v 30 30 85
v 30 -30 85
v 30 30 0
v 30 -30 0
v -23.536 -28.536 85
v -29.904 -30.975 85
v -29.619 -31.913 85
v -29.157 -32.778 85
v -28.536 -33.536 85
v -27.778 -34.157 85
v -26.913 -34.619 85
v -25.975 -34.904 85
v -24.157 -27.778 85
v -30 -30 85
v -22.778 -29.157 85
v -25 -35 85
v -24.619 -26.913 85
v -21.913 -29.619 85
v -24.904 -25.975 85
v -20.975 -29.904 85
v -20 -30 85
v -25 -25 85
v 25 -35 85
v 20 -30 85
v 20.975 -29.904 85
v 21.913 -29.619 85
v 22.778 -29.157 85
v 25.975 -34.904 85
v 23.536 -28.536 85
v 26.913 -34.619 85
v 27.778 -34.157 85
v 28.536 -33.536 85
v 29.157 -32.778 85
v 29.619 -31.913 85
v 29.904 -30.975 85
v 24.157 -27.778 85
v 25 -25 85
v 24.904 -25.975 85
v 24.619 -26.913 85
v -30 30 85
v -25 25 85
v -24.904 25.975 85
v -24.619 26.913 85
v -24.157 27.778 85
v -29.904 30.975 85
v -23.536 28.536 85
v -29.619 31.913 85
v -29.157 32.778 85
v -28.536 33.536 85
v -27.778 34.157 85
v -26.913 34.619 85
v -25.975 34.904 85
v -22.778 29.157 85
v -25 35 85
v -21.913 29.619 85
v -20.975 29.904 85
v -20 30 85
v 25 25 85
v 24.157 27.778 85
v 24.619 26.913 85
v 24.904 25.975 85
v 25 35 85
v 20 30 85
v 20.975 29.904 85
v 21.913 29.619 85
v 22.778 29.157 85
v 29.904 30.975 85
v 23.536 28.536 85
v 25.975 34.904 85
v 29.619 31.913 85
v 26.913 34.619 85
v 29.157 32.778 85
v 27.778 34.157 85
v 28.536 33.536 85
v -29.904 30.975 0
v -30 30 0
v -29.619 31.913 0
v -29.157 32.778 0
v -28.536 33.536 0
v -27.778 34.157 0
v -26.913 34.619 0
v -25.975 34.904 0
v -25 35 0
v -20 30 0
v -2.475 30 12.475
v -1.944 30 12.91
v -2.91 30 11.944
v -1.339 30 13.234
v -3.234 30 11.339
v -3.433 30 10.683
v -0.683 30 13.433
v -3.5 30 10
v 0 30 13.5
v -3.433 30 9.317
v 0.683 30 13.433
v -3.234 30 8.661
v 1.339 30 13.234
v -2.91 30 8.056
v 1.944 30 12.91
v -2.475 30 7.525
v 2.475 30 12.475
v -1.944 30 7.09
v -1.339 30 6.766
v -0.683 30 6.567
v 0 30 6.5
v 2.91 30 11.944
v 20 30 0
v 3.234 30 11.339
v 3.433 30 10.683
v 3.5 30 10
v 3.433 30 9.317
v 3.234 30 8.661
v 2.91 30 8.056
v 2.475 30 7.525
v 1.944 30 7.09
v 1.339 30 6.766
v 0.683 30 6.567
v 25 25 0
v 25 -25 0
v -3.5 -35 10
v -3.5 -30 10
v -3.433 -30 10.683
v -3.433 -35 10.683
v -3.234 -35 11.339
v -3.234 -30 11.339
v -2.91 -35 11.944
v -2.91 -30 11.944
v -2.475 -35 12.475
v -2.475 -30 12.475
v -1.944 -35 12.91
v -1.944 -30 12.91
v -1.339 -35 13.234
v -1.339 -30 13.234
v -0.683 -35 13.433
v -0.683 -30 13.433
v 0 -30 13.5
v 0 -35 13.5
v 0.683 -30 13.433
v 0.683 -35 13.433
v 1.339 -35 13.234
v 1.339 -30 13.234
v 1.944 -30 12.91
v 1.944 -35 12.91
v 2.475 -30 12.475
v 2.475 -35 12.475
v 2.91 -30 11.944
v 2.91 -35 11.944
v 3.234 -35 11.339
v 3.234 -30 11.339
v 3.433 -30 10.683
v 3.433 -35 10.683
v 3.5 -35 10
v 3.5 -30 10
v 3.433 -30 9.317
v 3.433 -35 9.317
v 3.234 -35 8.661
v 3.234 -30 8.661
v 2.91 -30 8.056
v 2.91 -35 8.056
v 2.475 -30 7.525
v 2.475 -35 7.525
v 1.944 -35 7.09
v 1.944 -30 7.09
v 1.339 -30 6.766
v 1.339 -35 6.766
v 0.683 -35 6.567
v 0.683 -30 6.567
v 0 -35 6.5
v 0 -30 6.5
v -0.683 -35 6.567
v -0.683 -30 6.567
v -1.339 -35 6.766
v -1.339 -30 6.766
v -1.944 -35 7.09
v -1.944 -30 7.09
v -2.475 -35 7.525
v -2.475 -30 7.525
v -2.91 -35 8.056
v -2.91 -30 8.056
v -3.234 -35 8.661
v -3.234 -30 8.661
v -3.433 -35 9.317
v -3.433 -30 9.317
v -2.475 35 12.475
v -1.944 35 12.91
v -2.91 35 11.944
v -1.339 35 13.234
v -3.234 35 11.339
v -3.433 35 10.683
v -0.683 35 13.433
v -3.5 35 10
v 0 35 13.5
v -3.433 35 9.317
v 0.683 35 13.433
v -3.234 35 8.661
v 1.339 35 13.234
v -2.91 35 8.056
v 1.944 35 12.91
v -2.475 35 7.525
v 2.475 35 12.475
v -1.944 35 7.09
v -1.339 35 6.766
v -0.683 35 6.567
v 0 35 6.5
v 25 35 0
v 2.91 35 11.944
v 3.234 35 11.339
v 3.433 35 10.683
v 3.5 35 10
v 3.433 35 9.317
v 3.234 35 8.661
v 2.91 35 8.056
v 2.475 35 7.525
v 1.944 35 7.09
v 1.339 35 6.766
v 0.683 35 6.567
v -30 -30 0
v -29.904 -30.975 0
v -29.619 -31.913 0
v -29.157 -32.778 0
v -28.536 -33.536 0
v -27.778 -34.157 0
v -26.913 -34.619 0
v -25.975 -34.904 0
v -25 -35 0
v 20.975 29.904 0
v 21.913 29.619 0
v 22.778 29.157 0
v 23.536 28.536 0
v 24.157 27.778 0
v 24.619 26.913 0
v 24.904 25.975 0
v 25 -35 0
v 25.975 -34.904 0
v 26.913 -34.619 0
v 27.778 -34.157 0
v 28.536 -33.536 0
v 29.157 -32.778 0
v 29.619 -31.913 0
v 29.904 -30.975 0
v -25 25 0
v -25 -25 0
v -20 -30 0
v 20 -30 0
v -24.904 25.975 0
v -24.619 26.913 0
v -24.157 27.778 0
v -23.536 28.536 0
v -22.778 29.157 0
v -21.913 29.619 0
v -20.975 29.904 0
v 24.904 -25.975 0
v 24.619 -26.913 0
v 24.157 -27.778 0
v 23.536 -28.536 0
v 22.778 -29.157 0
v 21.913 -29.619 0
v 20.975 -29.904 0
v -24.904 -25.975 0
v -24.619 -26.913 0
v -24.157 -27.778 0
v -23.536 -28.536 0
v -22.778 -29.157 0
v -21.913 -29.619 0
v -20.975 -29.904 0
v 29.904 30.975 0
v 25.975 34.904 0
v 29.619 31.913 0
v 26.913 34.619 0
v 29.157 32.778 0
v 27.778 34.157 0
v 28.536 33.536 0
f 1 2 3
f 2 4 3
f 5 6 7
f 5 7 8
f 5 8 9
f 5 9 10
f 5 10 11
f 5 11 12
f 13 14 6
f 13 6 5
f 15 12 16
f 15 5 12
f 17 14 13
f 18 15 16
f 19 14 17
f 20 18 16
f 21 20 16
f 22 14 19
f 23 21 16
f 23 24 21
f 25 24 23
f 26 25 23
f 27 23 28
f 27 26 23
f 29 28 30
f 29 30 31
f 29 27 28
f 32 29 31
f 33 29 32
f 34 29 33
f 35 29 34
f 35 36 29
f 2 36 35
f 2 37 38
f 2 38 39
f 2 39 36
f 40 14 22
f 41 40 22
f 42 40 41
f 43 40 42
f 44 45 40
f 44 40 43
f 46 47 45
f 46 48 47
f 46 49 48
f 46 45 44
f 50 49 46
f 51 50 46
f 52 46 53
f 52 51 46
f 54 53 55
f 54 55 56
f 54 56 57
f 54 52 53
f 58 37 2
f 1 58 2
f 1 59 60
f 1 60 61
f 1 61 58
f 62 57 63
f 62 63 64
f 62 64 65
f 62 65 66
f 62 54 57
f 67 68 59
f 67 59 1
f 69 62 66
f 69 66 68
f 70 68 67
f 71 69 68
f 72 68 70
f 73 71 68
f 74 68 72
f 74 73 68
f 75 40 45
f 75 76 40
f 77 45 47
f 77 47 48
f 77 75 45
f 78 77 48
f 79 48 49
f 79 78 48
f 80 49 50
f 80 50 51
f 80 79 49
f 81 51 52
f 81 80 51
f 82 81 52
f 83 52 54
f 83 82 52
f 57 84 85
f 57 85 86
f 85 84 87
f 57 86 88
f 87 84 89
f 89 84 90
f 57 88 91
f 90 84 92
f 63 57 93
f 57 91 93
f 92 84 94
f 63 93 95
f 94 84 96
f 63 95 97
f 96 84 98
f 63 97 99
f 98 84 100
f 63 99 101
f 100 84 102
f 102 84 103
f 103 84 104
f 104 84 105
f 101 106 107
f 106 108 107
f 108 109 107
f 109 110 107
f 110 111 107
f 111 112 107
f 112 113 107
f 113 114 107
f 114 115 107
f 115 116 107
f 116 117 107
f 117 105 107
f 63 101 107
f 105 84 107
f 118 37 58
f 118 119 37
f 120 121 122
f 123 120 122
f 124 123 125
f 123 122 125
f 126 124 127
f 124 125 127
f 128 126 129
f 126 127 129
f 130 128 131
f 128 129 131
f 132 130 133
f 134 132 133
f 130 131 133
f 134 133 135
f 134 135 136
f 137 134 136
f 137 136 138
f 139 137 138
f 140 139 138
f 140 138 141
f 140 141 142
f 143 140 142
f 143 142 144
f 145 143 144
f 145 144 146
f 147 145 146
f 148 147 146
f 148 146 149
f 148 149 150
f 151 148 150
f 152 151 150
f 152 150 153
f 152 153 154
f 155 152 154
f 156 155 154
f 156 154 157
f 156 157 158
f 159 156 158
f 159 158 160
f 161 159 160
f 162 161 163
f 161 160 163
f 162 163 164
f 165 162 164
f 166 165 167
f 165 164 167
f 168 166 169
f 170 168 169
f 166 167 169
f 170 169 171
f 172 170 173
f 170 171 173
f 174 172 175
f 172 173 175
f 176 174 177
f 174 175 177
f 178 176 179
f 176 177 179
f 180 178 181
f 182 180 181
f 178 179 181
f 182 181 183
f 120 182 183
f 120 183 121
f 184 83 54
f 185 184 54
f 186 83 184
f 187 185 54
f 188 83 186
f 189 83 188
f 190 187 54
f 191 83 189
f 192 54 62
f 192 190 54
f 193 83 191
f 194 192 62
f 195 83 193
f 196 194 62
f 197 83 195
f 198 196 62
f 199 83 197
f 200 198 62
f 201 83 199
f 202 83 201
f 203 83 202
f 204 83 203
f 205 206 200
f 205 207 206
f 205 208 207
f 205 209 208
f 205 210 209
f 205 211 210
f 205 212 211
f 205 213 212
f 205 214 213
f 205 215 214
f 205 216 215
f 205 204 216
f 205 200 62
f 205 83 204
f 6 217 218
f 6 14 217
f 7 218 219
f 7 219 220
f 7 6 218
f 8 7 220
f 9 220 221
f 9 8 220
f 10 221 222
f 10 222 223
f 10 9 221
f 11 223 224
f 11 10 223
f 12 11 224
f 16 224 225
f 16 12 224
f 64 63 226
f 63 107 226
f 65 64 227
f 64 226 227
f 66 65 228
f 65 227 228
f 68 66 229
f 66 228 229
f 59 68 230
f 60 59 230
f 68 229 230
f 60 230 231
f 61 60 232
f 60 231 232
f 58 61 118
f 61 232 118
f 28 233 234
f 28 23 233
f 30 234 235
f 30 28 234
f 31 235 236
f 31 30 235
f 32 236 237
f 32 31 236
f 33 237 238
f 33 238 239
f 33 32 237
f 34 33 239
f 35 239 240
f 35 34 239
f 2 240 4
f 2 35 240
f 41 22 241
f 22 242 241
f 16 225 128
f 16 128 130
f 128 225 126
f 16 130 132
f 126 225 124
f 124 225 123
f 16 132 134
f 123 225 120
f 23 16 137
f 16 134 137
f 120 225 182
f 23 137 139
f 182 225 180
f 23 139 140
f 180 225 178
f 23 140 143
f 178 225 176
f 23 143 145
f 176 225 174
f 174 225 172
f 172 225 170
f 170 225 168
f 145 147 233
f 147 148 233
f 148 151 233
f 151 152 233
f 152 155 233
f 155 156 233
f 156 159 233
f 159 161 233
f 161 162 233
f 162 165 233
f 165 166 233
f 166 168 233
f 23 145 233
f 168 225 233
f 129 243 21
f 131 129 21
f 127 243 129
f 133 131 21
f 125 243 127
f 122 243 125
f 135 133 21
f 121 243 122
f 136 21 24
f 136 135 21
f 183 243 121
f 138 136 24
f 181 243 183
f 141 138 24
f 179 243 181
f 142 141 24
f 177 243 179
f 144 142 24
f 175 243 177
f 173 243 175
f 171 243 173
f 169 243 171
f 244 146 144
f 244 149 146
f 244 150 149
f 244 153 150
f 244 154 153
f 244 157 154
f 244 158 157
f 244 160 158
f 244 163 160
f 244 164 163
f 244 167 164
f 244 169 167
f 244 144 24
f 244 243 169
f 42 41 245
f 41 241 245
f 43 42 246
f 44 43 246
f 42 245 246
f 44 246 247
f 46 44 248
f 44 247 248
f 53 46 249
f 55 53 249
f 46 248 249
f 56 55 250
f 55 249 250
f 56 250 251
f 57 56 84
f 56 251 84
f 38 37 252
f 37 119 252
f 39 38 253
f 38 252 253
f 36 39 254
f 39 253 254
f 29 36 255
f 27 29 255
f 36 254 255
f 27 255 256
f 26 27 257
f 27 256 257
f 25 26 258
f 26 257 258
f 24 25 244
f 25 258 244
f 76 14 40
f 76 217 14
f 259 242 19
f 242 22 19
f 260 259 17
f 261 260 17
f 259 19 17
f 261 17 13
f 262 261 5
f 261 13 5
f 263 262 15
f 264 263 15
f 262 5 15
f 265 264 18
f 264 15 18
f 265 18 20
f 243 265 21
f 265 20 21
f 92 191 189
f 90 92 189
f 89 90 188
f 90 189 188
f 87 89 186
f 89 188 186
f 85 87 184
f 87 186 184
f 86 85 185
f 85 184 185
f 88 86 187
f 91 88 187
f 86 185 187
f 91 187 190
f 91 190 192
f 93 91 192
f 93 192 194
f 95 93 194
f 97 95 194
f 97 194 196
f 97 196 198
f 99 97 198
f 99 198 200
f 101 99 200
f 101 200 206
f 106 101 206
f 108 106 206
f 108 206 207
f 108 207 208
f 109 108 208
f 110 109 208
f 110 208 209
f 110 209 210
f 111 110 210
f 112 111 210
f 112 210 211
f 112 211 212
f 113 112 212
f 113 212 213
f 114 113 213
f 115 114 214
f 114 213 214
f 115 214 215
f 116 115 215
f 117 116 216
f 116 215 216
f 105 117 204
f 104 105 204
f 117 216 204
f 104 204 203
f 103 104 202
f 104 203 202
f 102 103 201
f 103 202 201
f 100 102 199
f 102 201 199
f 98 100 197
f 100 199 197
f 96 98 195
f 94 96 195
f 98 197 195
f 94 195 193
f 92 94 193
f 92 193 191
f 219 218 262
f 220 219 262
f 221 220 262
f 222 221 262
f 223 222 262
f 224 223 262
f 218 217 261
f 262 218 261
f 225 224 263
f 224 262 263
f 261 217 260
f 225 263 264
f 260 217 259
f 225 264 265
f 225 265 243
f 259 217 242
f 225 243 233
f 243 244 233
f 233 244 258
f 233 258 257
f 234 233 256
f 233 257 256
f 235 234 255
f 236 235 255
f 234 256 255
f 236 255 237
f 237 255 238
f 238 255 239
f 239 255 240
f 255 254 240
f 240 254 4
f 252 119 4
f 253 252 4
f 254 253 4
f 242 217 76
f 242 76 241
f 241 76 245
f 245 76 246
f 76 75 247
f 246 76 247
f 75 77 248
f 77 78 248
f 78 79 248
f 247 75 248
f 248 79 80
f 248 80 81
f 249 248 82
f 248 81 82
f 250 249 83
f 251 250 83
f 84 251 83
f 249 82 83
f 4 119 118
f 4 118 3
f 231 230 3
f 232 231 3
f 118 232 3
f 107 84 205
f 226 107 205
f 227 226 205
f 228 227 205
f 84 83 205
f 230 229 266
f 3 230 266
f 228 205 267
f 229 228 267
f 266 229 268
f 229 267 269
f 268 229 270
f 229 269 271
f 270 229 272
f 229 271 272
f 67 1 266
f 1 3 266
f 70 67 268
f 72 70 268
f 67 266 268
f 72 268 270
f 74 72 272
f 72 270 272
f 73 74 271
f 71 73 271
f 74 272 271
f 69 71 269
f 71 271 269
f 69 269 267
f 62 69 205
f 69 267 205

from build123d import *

# Parameters (mm, degrees)
F0_W        = 60
F0_H        = 70
F0_W_2      = 50
F0_H_2      = 60
F1_DEPTH    = 25
F1_FACE_W   = 60
F1_FACE_H   = 70
F1_FACE_W_2 = 50
F1_FACE_H_2 = 60
F2_DEPTH    = 60
F3_R        = 5
F4_R        = 3.5
F5_DEPTH    = 70


with BuildPart() as f1:
    # F0 (on Top) → F1 (new body)
    with BuildSketch(Plane.XY):
        Rectangle(F0_W, F0_H)
        Rectangle(F0_W_2, F0_H_2, mode=Mode.SUBTRACT)
    extrude(amount=F1_DEPTH)

    # F1_face (on face) → F2 (join)
    with BuildSketch(Plane.XY.offset(25)):
        Rectangle(F1_FACE_W, F1_FACE_H)
        Rectangle(F1_FACE_W_2, F1_FACE_H_2, mode=Mode.SUBTRACT)
    extrude(amount=F2_DEPTH)

    # F3
    f3_edges = [f1.edges().sort_by_distance(p)[0] for p in [
        (25, 30, 42.5),
        (30, -35, 42.5),
        (-30, -35, 42.5),
        (-30, 35, 42.5),
        (30, 35, 42.5),
        (25, -30, 42.5),
        (-25, 30, 42.5),
        (-25, -30, 42.5),
    ]]
    fillet(f3_edges, radius=F3_R)

    # F4 (on face) → F5 (cut)
    with BuildSketch(Plane(origin=(0, 35, 0), x_dir=(-1, 0, 0), z_dir=(0, 1, 0))):
        with Locations((0, 10)):
            Circle(F4_R)
    extrude(amount=-F5_DEPTH, mode=Mode.SUBTRACT)


solid = f1.part
